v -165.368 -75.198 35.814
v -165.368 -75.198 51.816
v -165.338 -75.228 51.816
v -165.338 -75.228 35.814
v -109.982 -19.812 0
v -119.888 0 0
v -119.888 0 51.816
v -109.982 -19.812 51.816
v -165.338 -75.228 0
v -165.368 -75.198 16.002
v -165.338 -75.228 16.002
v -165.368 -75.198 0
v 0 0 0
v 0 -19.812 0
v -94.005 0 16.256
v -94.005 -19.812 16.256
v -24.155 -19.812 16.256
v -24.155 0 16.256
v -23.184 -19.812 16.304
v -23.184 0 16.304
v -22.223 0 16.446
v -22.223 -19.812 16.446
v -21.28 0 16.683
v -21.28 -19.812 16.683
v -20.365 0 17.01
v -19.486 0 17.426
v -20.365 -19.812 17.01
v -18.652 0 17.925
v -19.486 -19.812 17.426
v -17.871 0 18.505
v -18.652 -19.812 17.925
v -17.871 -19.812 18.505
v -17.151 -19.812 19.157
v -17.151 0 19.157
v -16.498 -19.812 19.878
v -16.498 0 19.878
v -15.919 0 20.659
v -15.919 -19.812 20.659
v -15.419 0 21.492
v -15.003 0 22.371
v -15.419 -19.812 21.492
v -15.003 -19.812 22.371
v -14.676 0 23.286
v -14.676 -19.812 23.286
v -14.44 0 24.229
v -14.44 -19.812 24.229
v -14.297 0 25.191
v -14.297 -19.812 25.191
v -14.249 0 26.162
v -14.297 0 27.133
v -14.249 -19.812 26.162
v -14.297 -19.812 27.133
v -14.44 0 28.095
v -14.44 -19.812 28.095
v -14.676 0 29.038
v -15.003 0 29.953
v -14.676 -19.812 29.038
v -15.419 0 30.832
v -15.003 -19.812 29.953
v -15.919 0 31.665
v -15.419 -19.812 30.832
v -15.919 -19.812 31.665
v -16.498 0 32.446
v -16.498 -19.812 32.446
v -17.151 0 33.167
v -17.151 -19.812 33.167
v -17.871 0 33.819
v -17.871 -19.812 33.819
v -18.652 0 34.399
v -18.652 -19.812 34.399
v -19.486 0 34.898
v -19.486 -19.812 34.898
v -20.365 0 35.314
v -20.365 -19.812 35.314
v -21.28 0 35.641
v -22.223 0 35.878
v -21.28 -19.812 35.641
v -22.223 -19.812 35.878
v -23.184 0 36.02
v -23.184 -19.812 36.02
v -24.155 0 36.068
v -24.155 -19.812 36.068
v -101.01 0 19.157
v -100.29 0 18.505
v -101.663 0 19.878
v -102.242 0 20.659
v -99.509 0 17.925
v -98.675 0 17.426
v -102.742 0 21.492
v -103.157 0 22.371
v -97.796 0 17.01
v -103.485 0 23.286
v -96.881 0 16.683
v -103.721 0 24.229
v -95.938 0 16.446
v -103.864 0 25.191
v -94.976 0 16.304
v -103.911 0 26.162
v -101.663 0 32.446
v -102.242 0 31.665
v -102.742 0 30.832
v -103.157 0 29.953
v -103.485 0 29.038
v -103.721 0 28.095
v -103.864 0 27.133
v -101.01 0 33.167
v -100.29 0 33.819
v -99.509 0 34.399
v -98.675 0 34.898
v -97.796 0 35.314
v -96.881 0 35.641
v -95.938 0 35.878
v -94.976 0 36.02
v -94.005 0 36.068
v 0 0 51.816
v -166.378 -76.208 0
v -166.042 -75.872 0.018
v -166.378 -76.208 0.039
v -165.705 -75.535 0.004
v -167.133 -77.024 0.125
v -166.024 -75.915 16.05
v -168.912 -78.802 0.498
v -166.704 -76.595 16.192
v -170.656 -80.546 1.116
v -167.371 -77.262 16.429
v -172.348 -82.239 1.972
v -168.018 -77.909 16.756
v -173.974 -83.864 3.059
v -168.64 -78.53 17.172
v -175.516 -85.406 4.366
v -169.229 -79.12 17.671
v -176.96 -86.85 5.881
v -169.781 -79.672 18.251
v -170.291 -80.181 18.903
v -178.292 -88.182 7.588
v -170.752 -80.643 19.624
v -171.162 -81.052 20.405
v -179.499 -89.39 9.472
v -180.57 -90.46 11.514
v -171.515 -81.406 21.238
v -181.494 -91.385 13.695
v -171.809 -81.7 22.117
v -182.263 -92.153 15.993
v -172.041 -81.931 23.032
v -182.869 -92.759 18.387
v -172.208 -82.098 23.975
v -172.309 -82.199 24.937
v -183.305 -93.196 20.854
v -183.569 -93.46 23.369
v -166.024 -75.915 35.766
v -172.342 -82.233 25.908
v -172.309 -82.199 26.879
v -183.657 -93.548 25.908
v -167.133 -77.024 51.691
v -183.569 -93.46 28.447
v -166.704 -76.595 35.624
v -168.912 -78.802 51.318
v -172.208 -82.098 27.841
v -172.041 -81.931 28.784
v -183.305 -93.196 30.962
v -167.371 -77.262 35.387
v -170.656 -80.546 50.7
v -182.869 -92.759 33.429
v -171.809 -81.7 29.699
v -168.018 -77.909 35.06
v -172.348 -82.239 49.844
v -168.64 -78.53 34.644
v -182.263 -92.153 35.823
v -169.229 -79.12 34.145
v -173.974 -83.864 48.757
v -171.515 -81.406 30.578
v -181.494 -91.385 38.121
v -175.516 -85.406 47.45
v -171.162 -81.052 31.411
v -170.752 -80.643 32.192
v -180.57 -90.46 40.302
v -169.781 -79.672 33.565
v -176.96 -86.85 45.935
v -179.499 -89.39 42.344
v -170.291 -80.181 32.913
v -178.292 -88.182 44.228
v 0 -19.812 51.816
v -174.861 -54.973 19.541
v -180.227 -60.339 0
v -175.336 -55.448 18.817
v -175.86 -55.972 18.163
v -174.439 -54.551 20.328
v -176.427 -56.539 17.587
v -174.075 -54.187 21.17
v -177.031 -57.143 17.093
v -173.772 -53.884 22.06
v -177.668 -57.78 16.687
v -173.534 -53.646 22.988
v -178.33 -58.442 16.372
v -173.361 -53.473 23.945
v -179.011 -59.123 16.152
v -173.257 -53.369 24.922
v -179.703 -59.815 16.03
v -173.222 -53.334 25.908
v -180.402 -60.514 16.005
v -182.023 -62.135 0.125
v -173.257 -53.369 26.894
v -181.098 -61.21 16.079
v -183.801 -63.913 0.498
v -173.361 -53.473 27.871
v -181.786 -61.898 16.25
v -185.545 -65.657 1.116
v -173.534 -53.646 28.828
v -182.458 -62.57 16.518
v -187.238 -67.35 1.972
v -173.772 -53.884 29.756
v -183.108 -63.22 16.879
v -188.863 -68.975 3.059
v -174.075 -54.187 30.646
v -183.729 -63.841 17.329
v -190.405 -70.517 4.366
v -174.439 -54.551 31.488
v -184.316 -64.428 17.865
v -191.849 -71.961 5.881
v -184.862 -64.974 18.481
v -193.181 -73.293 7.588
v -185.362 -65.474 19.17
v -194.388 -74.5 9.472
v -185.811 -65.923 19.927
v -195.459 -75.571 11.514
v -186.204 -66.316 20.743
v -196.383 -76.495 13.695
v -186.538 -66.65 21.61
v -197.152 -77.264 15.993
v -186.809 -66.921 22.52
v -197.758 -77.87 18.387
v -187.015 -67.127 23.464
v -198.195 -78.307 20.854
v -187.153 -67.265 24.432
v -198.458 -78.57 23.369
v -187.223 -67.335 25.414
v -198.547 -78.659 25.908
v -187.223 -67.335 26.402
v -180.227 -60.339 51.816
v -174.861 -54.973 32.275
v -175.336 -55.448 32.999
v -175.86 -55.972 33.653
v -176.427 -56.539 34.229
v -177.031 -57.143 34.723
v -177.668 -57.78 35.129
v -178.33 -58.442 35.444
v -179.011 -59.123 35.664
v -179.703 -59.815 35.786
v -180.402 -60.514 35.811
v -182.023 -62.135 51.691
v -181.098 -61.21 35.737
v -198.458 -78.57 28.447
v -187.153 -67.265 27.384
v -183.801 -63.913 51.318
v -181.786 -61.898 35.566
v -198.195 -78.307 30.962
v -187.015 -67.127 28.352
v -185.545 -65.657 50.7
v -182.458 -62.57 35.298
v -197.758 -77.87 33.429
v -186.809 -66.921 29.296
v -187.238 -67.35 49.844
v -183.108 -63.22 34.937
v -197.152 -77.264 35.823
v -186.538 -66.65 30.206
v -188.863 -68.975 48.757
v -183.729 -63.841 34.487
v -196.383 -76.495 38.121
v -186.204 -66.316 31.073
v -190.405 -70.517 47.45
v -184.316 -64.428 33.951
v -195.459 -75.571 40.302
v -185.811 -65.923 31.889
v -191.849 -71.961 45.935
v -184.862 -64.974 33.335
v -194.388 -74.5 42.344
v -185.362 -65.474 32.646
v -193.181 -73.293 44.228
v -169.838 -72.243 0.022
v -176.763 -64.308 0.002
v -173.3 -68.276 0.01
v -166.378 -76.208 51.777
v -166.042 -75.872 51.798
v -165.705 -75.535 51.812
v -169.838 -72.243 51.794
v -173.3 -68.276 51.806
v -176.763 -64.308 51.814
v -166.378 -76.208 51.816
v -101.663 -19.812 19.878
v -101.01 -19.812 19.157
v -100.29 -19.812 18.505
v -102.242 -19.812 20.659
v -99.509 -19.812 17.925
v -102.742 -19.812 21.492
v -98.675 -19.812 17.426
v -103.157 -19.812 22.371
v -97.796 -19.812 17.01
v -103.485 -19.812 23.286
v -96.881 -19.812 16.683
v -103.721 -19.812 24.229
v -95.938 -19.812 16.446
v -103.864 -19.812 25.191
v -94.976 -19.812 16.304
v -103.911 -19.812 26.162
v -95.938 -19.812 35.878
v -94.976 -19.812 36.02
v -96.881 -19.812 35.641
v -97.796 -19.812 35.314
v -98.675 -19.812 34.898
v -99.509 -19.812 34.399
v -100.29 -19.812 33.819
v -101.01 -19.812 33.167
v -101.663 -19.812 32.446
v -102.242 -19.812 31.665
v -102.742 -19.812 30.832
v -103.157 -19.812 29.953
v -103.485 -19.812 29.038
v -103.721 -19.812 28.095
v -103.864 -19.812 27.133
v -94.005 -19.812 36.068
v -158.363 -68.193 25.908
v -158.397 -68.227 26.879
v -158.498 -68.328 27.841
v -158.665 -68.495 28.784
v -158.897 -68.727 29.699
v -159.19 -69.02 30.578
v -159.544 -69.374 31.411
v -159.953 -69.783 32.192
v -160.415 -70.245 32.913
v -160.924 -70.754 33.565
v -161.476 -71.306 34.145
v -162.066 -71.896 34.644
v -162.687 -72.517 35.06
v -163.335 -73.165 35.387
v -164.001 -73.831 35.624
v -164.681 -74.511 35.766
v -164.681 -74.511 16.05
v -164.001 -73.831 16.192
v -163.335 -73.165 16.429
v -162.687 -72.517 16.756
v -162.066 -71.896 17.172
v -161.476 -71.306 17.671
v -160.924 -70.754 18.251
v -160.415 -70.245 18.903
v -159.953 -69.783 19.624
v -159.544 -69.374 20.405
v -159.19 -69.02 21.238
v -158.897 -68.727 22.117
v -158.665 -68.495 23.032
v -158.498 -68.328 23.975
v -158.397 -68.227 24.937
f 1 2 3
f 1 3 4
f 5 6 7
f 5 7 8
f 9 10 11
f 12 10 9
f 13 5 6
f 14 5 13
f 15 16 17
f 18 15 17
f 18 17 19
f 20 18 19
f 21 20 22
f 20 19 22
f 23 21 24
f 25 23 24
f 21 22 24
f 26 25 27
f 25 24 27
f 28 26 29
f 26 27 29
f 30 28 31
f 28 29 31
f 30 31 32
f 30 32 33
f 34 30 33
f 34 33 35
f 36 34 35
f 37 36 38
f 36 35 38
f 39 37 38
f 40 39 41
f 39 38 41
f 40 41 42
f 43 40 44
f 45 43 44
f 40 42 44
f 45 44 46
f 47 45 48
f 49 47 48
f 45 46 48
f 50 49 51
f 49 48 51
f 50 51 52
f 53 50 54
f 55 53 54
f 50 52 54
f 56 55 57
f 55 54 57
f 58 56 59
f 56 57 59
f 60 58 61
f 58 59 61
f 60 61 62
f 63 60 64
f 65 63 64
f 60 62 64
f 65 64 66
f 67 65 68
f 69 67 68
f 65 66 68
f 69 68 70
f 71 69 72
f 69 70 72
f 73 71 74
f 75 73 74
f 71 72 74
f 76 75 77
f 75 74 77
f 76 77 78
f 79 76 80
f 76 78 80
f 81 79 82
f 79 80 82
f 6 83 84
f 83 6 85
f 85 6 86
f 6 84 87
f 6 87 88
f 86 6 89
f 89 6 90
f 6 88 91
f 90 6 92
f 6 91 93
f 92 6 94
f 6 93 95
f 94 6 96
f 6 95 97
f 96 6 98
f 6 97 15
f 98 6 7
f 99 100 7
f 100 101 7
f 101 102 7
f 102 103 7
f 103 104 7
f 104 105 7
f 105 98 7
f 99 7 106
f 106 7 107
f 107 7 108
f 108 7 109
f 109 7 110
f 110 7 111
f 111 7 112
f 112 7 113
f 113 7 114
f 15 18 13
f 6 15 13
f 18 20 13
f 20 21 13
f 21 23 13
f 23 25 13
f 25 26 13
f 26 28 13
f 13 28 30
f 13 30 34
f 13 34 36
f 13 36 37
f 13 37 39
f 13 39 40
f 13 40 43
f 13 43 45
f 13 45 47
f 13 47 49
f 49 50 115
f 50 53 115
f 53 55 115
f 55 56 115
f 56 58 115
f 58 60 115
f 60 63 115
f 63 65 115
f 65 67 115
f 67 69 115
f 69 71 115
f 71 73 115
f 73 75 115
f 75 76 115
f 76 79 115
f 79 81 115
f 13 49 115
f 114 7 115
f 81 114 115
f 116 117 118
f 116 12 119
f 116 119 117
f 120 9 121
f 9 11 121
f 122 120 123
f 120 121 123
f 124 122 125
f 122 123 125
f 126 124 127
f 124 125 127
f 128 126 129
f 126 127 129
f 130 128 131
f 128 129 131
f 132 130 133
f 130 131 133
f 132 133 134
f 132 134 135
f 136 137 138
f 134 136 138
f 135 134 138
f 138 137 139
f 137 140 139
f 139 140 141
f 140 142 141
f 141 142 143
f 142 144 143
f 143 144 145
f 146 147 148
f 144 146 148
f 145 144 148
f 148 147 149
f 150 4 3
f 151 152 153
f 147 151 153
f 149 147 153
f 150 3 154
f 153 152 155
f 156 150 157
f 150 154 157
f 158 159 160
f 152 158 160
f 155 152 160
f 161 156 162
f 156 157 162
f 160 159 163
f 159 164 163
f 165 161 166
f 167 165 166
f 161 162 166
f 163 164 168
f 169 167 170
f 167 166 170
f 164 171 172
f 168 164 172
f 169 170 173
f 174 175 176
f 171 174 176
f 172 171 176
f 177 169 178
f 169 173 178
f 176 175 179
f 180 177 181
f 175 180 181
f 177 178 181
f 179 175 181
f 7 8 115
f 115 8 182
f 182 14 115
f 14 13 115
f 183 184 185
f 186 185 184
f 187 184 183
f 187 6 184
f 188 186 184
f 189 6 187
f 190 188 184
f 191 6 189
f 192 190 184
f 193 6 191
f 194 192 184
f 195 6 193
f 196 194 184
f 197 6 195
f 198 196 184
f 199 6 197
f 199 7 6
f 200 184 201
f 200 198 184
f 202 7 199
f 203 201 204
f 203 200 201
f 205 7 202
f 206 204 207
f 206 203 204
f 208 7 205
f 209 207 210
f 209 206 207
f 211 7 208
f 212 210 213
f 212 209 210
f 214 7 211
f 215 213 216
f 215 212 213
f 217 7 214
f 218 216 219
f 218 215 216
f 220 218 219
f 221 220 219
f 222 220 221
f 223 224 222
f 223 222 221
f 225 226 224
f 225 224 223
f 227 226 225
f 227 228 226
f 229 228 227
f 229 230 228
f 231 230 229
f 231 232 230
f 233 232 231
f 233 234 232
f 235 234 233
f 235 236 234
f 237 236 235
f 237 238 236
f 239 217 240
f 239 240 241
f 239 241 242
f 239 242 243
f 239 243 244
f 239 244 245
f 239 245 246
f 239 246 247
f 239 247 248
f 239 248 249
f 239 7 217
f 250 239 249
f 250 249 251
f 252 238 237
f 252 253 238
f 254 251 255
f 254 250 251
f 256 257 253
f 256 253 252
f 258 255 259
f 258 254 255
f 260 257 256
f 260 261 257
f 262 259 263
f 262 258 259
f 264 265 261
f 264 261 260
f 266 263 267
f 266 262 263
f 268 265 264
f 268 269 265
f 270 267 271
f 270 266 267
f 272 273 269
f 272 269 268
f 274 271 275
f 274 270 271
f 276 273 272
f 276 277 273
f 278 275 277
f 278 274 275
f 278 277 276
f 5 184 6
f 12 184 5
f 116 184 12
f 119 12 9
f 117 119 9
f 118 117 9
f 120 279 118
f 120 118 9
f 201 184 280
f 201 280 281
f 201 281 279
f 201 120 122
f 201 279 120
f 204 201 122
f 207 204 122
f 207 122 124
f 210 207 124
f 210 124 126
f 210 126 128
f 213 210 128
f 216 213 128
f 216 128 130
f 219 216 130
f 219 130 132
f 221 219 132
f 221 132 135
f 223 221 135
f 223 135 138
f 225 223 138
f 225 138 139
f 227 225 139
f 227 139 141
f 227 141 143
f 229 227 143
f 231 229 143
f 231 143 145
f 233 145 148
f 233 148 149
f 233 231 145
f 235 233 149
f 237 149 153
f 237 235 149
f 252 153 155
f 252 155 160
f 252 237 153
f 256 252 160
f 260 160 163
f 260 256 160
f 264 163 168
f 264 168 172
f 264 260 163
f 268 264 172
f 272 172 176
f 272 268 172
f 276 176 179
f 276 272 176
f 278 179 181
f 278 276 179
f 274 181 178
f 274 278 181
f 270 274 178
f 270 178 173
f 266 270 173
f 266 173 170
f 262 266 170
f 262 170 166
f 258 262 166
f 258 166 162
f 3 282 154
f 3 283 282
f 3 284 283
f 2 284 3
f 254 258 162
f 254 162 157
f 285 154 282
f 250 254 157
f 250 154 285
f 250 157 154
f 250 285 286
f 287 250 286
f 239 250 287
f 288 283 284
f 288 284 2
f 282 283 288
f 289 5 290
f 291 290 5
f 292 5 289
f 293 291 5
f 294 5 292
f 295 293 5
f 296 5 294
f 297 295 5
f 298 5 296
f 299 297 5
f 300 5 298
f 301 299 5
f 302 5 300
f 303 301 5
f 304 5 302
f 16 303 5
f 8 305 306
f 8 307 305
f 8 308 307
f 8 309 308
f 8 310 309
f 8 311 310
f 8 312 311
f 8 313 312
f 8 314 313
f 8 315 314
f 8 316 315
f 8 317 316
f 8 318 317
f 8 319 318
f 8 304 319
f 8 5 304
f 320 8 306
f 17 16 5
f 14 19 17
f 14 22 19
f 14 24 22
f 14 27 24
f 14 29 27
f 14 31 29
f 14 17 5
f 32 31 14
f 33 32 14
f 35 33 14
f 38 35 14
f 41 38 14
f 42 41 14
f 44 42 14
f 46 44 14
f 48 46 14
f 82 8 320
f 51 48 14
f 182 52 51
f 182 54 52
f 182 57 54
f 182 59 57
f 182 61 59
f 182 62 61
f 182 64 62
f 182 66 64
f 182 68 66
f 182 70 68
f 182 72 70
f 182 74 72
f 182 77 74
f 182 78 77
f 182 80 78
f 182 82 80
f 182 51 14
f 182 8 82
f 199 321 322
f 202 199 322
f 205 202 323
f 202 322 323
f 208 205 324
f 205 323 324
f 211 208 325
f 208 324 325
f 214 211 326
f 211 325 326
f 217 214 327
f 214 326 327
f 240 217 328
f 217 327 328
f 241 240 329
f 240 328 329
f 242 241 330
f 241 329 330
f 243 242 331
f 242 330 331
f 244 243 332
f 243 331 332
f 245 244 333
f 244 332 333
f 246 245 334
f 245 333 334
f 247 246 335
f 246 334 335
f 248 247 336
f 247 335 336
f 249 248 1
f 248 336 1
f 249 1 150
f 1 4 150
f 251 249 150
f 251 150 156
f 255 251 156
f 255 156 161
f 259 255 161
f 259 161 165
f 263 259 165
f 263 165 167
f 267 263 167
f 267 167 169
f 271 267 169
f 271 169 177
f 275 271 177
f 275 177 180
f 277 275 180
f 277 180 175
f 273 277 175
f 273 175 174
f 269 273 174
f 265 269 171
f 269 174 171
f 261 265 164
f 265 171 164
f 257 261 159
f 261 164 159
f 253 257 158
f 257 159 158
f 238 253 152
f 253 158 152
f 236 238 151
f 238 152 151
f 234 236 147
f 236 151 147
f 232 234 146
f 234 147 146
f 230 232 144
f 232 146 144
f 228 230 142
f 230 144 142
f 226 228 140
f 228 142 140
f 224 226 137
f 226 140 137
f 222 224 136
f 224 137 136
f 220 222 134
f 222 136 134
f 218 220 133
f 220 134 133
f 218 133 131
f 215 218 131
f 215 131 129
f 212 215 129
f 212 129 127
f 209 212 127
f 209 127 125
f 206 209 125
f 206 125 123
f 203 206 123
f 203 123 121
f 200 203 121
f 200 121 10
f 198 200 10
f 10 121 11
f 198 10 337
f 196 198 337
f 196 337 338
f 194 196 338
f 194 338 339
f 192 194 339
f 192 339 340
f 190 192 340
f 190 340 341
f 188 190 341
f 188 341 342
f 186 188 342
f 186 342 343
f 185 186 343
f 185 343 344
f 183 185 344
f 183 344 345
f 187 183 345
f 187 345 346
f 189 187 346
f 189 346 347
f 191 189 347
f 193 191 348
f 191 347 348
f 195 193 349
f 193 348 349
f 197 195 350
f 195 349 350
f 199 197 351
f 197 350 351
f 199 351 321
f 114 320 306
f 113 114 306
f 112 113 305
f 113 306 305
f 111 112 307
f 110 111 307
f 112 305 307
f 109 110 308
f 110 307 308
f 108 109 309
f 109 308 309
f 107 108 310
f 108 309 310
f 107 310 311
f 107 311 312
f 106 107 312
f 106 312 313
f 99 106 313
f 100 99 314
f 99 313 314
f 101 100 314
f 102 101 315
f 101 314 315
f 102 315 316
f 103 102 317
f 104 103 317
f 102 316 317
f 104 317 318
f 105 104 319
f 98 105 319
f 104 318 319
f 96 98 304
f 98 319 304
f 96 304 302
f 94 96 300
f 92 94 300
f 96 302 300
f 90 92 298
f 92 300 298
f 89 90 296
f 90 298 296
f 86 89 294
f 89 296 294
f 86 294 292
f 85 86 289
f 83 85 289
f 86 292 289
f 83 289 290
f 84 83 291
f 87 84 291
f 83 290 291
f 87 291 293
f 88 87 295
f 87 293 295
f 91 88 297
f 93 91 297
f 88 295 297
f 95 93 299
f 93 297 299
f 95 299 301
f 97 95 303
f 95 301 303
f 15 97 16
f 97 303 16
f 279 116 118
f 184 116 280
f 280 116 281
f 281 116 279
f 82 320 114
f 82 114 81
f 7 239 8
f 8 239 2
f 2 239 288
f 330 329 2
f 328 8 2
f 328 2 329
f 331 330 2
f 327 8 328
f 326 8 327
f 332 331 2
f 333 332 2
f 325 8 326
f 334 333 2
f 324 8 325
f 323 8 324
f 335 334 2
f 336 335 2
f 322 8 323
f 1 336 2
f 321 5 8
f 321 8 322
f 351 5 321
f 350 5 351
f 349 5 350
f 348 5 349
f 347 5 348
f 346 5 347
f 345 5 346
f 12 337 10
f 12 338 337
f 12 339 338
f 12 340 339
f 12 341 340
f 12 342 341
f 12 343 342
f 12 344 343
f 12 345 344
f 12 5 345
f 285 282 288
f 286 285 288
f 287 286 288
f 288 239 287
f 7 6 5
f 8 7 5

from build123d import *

# Parameters (mm, degrees)
F0_W      = 119.888
F0_H      = 51.816
F1_DEPTH  = 9.906
F2_W      = 109.982
F2_H      = 51.816
F3_DEPTH  = 9.906
F5_DEPTH  = 51.816
F7_DEPTH  = 51.816
F9_DEPTH  = 51.816
F11_DEPTH = 21.0566
F12_W     = 69.85
F12_H     = 19.812
F13_DEPTH = 19.812
F14_R     = 9.906
F15_DEPTH = 25.4


with BuildPart() as f1:
    # F0 (on Front) → F1 (new body)
    with BuildSketch(Plane.XZ):
        with Locations((-59.944, 25.908)):
            Rectangle(F0_W, F0_H)
    extrude(amount=F1_DEPTH)

    # F2 (on face) → F3 (join)
    with BuildSketch(Plane.XZ.offset(9.906)):
        with Locations((-54.991, 25.908)):
            Rectangle(F2_W, F2_H)
    extrude(amount=F3_DEPTH)

    # F4 (on face) → F5 (join)
    with BuildSketch(Plane(origin=(0, 0, 0), x_dir=(1, 0, 0), z_dir=(0, 0, -1))):
        Polygon((-109.982, 9.906), (-109.982, 19.812), (-119.888, 9.906), align=None)
    extrude(amount=-F5_DEPTH)

    # F6 (on face) → F7 (cut)
    with BuildSketch(Plane(origin=(0, 0, 0), x_dir=(1, 0, 0), z_dir=(0, 0, -1))):
        Polygon((-119.888, 0), (-109.982, 19.812), (-119.888, 9.906), align=None)
    extrude(amount=-F7_DEPTH, mode=Mode.SUBTRACT)

    # F12 (on face) → F13 (cut)
    with BuildSketch(Plane.XZ.offset(19.812)):
        with Locations((-59.080427, 26.162)):
            Rectangle(F12_W, F12_H)
        with BuildLine():
            Line((-94.005427, 16.256), (-94.005427, 36.068))
            ThreePointArc((-94.005427, 36.068), (-103.911427, 26.162), (-94.005427, 16.256))
        make_face()
        with BuildLine():
            ThreePointArc((-24.155427, 16.256), (-14.249427, 26.162), (-24.155427, 36.068))
            Line((-24.155427, 36.068), (-24.155427, 16.256))
        make_face()
    extrude(amount=-F13_DEPTH, mode=Mode.SUBTRACT)


with BuildPart() as f9:
    # F8 (on face) → F9 (new body)
    with BuildSketch(Plane(origin=(0, 0, 0), x_dir=(1, 0, 0), z_dir=(0, 0, -1))):
        Polygon((-119.888, 0), (-109.982, 19.812), (-166.378008, 76.208008), (-180.226938, 60.338938), align=None)
    extrude(amount=-F9_DEPTH)

    # F10 (on face) → F11 (join)
    with BuildSketch(Plane(origin=(-59.944, 59.944, 0), x_dir=(-0.707107, -0.707107, 0), z_dir=(-0.707107, 0.707107, 0))):
        with BuildLine():
            Line((170.105762, 51.816), (170.105762, 0))
            ThreePointArc((170.105762, 0), (196.013762, 25.908), (170.105762, 51.816))
        make_face()
    extrude(amount=-F11_DEPTH)

    # F14 (on face) → F15 (cut)
    with BuildSketch(Plane(origin=(-45.054735, 45.054735, 0), x_dir=(0.707107, 0.707107, 0), z_dir=(0.707107, -0.707107, 0))):
        with Locations((-170.105762, 25.908)):
            Circle(F14_R)
    extrude(amount=-F15_DEPTH, mode=Mode.SUBTRACT)


solid = Compound([f1.part, f9.part])
